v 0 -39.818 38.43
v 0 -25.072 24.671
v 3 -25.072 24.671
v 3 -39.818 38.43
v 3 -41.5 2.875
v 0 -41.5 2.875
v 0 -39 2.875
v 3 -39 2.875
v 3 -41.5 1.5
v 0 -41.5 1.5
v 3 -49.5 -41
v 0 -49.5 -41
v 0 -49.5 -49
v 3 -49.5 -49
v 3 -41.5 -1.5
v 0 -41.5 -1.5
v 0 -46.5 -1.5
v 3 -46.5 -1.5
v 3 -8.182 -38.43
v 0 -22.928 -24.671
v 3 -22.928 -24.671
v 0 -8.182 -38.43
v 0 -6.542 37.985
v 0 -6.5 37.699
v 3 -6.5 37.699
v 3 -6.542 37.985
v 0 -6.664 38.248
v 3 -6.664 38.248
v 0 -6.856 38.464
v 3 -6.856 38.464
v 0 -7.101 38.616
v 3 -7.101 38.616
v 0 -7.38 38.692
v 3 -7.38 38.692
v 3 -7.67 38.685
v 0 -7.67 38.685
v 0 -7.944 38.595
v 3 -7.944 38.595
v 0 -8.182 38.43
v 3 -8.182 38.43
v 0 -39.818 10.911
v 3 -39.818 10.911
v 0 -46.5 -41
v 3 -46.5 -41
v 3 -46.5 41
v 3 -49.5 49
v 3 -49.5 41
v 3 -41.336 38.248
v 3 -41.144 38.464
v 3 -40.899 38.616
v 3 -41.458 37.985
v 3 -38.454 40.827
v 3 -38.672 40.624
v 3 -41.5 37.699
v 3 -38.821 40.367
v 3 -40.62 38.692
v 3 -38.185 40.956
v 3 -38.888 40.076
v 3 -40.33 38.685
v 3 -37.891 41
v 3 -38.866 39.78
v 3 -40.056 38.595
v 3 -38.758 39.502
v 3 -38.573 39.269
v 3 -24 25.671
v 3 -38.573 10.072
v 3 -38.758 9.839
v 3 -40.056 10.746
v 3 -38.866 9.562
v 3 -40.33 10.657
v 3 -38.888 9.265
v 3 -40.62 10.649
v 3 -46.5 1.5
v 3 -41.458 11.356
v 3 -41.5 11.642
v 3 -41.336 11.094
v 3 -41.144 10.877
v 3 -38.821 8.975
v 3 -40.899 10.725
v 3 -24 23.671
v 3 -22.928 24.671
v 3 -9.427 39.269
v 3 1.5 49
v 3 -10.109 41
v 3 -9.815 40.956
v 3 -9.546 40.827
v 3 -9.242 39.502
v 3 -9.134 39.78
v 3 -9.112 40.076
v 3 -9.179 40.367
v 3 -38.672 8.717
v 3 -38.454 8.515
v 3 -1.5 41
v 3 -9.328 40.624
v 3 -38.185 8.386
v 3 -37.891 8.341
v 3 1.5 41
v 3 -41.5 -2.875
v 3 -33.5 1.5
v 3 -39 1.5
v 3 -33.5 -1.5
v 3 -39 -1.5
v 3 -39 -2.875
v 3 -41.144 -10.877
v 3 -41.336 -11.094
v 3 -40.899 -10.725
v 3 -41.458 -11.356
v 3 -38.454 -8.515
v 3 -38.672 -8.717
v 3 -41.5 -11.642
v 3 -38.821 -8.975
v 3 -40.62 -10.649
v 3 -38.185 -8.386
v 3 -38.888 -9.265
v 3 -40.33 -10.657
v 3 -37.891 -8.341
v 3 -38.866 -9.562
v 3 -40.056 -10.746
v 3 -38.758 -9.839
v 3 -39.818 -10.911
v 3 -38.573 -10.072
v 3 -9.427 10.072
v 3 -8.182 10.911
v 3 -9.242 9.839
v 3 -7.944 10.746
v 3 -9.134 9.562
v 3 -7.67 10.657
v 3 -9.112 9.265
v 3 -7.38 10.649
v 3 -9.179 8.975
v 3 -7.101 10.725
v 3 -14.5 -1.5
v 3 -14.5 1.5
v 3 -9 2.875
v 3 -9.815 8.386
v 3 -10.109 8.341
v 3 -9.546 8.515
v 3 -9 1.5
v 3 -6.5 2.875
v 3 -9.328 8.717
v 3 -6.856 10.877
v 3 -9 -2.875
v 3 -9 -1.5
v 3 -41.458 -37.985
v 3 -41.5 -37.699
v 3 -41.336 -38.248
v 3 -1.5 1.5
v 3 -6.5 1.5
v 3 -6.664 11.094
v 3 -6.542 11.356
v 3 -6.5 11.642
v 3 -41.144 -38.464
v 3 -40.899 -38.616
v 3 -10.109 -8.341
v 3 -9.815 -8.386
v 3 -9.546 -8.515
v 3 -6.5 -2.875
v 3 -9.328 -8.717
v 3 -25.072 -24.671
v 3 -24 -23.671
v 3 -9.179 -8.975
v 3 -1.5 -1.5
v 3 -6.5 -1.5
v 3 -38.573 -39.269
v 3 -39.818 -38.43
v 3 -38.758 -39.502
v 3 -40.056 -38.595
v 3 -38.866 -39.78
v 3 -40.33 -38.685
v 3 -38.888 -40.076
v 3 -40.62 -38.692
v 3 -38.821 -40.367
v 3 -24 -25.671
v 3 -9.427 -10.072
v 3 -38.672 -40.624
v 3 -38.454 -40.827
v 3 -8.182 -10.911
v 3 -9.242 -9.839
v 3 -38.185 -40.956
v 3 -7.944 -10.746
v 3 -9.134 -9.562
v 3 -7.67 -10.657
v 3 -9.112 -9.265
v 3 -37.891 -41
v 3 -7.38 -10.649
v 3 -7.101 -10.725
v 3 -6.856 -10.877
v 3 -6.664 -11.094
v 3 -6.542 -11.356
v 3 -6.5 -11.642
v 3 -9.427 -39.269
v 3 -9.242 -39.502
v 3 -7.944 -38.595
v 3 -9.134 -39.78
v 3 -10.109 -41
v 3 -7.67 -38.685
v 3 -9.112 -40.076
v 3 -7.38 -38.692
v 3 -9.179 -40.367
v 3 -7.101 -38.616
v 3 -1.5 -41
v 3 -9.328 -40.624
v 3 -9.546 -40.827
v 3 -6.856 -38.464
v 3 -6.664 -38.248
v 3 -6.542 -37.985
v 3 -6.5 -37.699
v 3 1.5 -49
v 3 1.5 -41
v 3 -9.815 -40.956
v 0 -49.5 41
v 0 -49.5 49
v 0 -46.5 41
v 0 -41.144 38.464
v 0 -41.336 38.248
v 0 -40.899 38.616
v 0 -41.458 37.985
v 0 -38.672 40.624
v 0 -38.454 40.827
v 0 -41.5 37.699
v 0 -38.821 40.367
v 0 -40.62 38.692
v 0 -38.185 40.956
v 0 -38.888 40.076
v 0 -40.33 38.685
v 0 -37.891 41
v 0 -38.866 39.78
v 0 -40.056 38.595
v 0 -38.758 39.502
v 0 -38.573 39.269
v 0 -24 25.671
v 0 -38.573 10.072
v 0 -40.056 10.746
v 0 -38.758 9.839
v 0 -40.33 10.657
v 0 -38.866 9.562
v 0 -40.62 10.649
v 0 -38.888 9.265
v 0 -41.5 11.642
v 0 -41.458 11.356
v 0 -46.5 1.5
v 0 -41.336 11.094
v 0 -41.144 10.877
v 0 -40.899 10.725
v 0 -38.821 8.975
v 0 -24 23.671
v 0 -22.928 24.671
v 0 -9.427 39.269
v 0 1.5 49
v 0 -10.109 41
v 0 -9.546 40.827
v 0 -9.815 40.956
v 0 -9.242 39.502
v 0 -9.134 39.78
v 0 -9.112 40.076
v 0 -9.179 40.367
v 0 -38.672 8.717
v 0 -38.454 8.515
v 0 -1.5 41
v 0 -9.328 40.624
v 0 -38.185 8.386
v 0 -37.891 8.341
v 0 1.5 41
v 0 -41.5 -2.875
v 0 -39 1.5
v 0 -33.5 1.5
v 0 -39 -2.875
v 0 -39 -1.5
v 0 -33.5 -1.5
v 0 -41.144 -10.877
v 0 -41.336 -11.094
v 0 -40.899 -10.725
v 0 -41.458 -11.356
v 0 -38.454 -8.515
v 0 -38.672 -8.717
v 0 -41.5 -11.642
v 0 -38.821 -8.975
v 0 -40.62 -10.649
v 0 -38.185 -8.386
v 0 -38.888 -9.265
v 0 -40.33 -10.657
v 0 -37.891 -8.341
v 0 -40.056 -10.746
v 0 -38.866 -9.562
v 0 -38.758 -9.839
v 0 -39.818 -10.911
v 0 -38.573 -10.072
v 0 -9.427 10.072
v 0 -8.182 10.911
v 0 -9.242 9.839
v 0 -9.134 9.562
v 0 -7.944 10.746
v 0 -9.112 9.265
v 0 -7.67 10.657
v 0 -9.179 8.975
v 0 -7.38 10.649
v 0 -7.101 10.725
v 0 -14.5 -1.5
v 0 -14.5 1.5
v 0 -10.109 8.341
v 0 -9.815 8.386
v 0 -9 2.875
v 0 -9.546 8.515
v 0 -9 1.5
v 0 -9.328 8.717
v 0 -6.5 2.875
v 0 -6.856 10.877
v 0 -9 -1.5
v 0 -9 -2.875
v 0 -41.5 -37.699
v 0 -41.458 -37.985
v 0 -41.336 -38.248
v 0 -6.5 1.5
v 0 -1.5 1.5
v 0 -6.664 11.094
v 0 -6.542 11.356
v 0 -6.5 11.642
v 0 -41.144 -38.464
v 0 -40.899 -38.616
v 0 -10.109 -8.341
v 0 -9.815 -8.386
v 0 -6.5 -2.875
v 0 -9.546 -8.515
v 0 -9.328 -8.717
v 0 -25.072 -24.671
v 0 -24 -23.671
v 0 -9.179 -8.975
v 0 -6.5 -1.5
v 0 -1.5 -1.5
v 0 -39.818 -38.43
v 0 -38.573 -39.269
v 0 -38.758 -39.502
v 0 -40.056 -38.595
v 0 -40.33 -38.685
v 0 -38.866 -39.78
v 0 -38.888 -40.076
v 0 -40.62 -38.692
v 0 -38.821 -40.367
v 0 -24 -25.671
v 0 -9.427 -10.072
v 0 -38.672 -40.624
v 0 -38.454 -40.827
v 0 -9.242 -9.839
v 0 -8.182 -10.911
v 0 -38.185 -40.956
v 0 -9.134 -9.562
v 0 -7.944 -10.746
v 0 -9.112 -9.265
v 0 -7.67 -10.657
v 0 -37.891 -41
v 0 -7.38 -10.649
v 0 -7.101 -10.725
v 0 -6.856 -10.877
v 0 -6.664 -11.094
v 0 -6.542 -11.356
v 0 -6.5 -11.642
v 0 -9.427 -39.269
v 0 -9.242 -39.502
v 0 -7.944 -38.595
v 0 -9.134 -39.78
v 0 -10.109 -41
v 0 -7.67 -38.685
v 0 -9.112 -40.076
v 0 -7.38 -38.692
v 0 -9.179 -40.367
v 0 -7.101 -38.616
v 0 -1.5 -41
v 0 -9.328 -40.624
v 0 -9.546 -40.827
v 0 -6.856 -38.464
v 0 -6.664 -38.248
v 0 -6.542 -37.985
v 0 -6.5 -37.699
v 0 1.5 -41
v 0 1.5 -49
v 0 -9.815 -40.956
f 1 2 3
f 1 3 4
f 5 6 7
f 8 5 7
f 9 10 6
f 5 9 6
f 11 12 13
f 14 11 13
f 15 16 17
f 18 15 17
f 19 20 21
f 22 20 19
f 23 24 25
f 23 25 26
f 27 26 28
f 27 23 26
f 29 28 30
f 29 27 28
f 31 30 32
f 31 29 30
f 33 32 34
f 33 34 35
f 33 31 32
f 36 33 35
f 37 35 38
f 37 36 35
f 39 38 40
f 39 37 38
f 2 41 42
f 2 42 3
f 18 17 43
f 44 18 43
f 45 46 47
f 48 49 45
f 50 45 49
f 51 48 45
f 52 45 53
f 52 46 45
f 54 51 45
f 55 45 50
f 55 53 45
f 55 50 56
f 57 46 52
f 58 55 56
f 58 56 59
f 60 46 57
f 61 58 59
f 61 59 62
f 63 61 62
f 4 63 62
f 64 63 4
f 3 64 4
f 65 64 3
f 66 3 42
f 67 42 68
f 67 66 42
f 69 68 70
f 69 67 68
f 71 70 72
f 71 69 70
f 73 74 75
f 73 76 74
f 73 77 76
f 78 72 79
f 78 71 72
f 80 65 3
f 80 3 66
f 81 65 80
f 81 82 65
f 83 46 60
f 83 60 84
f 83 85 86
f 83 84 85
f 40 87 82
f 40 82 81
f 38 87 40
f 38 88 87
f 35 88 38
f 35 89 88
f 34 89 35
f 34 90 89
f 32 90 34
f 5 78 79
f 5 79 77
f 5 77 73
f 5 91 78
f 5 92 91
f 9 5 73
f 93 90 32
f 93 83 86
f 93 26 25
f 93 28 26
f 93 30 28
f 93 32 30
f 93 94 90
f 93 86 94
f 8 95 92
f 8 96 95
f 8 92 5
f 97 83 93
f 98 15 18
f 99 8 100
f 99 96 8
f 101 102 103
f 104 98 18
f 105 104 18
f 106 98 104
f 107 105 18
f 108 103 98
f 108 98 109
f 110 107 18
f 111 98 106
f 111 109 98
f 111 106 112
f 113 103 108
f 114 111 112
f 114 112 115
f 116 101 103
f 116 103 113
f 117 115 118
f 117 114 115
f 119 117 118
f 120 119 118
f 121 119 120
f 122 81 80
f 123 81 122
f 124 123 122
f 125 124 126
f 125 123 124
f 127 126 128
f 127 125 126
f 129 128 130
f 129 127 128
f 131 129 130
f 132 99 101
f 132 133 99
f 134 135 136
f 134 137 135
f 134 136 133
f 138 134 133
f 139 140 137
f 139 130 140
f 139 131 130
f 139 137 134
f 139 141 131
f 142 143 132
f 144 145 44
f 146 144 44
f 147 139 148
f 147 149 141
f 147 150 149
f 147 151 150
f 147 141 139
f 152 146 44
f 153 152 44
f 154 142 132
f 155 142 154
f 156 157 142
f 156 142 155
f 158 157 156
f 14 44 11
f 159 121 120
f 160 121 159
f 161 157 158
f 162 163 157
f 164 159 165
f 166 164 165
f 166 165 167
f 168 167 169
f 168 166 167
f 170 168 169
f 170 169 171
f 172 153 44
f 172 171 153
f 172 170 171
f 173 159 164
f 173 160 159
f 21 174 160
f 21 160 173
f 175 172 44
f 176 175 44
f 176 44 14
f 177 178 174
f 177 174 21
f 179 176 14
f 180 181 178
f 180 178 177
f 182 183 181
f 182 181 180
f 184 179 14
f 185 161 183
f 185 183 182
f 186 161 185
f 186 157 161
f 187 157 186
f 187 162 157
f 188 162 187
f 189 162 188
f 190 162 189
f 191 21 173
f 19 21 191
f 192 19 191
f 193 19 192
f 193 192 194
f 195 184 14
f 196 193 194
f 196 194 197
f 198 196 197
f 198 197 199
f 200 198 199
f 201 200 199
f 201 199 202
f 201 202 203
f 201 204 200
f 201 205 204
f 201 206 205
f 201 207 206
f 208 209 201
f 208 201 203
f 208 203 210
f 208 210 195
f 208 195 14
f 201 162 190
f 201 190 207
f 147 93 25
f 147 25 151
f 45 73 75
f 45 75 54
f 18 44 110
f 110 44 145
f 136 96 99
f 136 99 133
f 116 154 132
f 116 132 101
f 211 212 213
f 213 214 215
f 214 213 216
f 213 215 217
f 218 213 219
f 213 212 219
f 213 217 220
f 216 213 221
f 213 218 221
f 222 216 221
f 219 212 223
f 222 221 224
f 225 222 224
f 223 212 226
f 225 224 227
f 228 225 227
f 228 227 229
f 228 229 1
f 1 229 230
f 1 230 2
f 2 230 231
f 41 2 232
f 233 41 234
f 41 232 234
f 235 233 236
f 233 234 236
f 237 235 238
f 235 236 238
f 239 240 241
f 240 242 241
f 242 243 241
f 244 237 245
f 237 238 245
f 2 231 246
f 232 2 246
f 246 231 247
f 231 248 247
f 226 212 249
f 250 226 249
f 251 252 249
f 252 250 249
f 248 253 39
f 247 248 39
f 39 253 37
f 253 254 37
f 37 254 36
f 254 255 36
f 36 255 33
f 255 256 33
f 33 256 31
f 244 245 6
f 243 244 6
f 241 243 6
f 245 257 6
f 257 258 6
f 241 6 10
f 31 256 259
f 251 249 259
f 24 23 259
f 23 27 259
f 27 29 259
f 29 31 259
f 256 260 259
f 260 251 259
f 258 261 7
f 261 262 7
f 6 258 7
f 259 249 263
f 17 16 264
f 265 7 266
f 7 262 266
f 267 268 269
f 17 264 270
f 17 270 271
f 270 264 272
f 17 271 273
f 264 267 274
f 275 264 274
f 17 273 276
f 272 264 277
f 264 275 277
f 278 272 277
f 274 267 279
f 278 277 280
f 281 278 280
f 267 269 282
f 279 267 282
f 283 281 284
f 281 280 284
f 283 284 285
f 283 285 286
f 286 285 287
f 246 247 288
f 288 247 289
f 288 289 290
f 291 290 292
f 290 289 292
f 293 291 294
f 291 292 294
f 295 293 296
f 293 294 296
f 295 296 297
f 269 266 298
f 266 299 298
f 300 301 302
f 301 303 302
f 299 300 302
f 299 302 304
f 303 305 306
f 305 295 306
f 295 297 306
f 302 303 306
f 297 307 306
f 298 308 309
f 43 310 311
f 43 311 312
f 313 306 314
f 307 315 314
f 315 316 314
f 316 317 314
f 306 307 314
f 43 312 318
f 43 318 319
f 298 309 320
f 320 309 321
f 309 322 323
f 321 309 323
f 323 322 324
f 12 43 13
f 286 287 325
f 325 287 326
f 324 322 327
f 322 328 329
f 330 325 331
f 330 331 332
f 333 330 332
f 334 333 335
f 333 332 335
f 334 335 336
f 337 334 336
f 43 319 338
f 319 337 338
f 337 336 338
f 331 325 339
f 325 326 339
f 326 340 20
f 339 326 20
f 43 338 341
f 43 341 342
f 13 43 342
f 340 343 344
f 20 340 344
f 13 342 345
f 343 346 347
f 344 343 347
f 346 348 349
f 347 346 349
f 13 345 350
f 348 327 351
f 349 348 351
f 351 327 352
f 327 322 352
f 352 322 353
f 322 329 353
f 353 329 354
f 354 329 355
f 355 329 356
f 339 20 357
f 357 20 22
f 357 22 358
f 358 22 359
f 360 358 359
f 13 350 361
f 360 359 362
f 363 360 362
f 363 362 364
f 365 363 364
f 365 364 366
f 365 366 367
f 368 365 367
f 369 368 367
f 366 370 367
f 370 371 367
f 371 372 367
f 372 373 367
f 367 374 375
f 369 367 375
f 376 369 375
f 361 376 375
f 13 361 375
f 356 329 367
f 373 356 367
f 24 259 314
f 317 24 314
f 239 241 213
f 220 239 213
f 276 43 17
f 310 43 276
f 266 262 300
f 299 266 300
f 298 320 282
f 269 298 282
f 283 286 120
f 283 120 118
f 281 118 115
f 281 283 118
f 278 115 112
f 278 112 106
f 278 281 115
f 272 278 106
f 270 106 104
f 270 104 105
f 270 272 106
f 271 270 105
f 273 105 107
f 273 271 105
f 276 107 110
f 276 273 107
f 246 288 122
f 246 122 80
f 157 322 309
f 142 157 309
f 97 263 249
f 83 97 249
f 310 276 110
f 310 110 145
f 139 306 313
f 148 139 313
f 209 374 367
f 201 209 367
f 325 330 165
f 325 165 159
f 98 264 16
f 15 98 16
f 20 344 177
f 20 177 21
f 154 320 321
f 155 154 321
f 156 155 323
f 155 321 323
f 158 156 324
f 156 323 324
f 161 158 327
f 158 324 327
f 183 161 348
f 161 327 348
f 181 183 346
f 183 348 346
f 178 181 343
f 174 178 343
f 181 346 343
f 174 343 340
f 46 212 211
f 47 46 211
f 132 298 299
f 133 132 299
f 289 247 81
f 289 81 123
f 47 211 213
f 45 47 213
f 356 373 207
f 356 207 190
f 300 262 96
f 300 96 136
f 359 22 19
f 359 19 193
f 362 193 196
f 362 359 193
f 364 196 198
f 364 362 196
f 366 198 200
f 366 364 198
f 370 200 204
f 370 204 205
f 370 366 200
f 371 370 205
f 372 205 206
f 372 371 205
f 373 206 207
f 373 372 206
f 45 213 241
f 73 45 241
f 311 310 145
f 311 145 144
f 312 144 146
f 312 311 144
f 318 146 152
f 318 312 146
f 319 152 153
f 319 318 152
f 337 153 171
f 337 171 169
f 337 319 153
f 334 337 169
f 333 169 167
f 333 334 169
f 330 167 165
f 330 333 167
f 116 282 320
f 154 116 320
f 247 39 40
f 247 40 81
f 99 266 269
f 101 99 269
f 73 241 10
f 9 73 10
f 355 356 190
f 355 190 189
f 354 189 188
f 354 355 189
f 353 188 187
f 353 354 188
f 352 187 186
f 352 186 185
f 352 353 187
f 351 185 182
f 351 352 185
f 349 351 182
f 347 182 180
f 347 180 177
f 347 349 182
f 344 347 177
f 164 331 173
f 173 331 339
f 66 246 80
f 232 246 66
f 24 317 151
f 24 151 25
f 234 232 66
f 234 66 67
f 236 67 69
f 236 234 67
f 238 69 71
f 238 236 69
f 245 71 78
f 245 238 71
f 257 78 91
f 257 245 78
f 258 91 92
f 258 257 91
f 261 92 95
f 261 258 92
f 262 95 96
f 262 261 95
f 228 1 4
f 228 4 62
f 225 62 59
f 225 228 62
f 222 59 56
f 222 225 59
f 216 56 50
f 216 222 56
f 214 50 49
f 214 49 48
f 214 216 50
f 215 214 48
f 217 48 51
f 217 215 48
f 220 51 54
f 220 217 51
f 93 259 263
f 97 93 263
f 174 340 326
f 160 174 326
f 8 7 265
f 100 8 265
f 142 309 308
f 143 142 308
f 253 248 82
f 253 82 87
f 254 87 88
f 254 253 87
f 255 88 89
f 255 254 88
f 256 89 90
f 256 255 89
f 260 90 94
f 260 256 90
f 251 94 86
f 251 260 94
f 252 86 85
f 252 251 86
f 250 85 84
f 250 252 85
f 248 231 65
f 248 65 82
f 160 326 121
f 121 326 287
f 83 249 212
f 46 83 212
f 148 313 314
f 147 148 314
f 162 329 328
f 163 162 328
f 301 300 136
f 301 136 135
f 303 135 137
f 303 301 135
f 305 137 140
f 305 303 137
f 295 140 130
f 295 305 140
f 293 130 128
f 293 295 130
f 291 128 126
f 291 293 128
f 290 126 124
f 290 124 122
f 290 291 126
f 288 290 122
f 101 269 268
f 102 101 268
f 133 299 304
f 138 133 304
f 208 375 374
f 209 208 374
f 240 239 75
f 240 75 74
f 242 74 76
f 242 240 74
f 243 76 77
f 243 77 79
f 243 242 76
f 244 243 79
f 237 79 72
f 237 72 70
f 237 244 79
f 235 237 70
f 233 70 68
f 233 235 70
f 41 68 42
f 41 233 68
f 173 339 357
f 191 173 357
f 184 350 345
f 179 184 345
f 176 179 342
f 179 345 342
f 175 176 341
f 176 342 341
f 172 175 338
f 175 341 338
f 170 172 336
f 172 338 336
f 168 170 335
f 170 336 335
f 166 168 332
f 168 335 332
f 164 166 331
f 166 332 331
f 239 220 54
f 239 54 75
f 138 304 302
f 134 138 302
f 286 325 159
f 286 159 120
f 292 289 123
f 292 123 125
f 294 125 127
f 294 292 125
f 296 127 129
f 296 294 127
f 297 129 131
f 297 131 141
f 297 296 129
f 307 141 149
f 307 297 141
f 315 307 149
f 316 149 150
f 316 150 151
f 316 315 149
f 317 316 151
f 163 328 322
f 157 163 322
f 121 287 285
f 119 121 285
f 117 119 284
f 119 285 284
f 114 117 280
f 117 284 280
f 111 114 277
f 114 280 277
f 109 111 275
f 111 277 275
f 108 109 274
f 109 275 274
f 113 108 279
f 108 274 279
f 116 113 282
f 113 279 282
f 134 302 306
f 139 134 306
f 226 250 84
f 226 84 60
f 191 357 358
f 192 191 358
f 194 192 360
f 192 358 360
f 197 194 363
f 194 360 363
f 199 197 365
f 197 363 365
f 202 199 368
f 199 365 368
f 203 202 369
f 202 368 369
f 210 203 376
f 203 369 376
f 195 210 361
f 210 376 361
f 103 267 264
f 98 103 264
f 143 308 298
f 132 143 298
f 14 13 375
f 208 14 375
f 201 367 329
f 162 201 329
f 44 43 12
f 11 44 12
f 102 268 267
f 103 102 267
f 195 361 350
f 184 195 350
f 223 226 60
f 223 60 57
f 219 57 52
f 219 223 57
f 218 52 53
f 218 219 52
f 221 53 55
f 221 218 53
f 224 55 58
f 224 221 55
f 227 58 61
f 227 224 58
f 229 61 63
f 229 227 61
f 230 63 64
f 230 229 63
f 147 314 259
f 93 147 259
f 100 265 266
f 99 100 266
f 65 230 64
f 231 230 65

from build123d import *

# Parameters (mm, degrees)
RESSALTO_EXTRUS_O1_DEPTH = 3


with BuildPart() as part:
    # Esboço1 → Ressalto-extrusão1 (new body)
    with BuildSketch(Plane(origin=(0, 0, 0), x_dir=(0, 0, -1), z_dir=(1, 0, 0))):
        Polygon((49, 1.499999999), (41, 1.499999999), (41, -1.500000001), (33.485947172, -1.500000001), (1.5, -1.500000001), (1.5, -6.500000001), (2.875, -6.500000001), (2.875, -9.000000001), (1.5, -9.000000001), (1.5, -14.500000001), (-1.5, -14.500000001), (-1.5, -9.000000001), (-2.875, -9.000000001), (-2.875, -6.500000001), (-1.5, -6.500000001), (-1.5, -1.500000001), (-40.999999999, -1.500000001), (-40.999999999, 1.499999999), (-48.999999999, 1.499999999), (-48.999999999, -1.500000001), (-48.999999999, -46.500000001), (-48.999999999, -49.500000001), (-40.999999999, -49.500000001), (-40.999999999, -46.500000001), (-1.5, -46.500000001), (-1.5, -41.500000001), (-2.875, -41.500000001), (-2.875, -39.000000001), (-1.5, -39.000000001), (-1.5, -33.500000001), (1.5, -33.500000001), (1.5, -39.000000001), (2.875, -39.000000001), (2.875, -41.500000001), (1.5, -41.500000001), (1.5, -46.500000001), (33.485947172, -46.500000001), (41, -46.500000001), (41, -49.5), (49, -49.5), (49, -46.500000001), (49, -24.000000001), (49, -1.500000001), align=None)
        with BuildLine():
            Line((-40.999999999, -10.109163073), (-40.999999999, -37.890836928))
            ThreePointArc((-40.999999999, -37.890836928), (-40.366648114, -38.821196622), (-39.26886168, -38.573066184))
            Line((-39.26886168, -38.573066184), (-25.670652093, -24.000000001))
            Line((-25.670652093, -24.000000001), (-39.26886168, -9.426933817))
            ThreePointArc((-39.26886168, -9.426933817), (-40.366648114, -9.17880338), (-40.999999999, -10.109163073))
        make_face(mode=Mode.SUBTRACT)
        with BuildLine():
            Line((-37.699164149, -41.500000001), (-11.642140036, -41.500000001))
            ThreePointArc((-11.642140036, -41.500000001), (-10.725017019, -40.898604281), (-10.911001717, -39.817770745))
            Line((-10.911001717, -39.817770745), (-24.670652093, -25.071690071))
            Line((-24.670652093, -25.071690071), (-38.430302469, -39.817770745))
            ThreePointArc((-38.430302469, -39.817770745), (-38.616287166, -40.898604281), (-37.699164149, -41.500000001))
        make_face(mode=Mode.SUBTRACT)
        with BuildLine():
            Line((-8.341304186, -37.890836928), (-8.341304186, -10.109163073))
            ThreePointArc((-8.341304186, -10.109163073), (-8.974656071, -9.17880338), (-10.072442506, -9.426933817))
            Line((-10.072442506, -9.426933817), (-23.670652093, -24.000000001))
            Line((-23.670652093, -24.000000001), (-10.072442506, -38.573066184))
            ThreePointArc((-10.072442506, -38.573066184), (-8.974656071, -38.821196622), (-8.341304186, -37.890836928))
        make_face(mode=Mode.SUBTRACT)
        with BuildLine():
            Line((-11.642140036, -6.500000001), (-37.699164149, -6.500000001))
            ThreePointArc((-37.699164149, -6.500000001), (-38.616287166, -7.101395721), (-38.430302469, -8.182229257))
            Line((-38.430302469, -8.182229257), (-24.670652093, -22.928309931))
            Line((-24.670652093, -22.928309931), (-10.911001717, -8.182229257))
            ThreePointArc((-10.911001717, -8.182229257), (-10.725017019, -7.101395721), (-11.642140036, -6.500000001))
        make_face(mode=Mode.SUBTRACT)
        with BuildLine():
            Line((10.911001717, -8.182229257), (24.670652093, -22.928309931))
            Line((24.670652093, -22.928309931), (38.430302469, -8.182229257))
            ThreePointArc((38.430302469, -8.182229257), (38.616287166, -7.101395721), (37.699164149, -6.500000001))
            Line((37.699164149, -6.500000001), (11.642140036, -6.500000001))
            ThreePointArc((11.642140036, -6.500000001), (10.725017019, -7.101395721), (10.911001717, -8.182229257))
        make_face(mode=Mode.SUBTRACT)
        with BuildLine():
            Line((10.072442506, -9.426933817), (23.670652093, -24.000000001))
            Line((23.670652093, -24.000000001), (10.072442506, -38.573066184))
            ThreePointArc((10.072442506, -38.573066184), (8.974656071, -38.821196622), (8.341304186, -37.890836928))
            Line((8.341304186, -37.890836928), (8.341304186, -10.109163073))
            ThreePointArc((8.341304186, -10.109163073), (8.974656071, -9.17880338), (10.072442506, -9.426933817))
        make_face(mode=Mode.SUBTRACT)
        with BuildLine():
            Line((25.670652093, -24.000000001), (39.26886168, -9.426933817))
            ThreePointArc((39.26886168, -9.426933817), (40.366648114, -9.17880338), (40.999999999, -10.109163073))
            Line((40.999999999, -10.109163073), (40.999999999, -37.890836928))
            ThreePointArc((40.999999999, -37.890836928), (40.366648114, -38.821196622), (39.26886168, -38.573066184))
            Line((39.26886168, -38.573066184), (25.670652093, -24.000000001))
        make_face(mode=Mode.SUBTRACT)
        with BuildLine():
            Line((24.670652093, -25.071690071), (10.911001717, -39.817770745))
            ThreePointArc((10.911001717, -39.817770745), (10.725017019, -40.898604281), (11.642140036, -41.500000001))
            Line((11.642140036, -41.500000001), (37.699164149, -41.500000001))
            ThreePointArc((37.699164149, -41.500000001), (38.616287166, -40.898604281), (38.430302469, -39.817770745))
            Line((38.430302469, -39.817770745), (24.670652093, -25.071690071))
        make_face(mode=Mode.SUBTRACT)
    extrude(amount=RESSALTO_EXTRUS_O1_DEPTH)


solid = part.part
